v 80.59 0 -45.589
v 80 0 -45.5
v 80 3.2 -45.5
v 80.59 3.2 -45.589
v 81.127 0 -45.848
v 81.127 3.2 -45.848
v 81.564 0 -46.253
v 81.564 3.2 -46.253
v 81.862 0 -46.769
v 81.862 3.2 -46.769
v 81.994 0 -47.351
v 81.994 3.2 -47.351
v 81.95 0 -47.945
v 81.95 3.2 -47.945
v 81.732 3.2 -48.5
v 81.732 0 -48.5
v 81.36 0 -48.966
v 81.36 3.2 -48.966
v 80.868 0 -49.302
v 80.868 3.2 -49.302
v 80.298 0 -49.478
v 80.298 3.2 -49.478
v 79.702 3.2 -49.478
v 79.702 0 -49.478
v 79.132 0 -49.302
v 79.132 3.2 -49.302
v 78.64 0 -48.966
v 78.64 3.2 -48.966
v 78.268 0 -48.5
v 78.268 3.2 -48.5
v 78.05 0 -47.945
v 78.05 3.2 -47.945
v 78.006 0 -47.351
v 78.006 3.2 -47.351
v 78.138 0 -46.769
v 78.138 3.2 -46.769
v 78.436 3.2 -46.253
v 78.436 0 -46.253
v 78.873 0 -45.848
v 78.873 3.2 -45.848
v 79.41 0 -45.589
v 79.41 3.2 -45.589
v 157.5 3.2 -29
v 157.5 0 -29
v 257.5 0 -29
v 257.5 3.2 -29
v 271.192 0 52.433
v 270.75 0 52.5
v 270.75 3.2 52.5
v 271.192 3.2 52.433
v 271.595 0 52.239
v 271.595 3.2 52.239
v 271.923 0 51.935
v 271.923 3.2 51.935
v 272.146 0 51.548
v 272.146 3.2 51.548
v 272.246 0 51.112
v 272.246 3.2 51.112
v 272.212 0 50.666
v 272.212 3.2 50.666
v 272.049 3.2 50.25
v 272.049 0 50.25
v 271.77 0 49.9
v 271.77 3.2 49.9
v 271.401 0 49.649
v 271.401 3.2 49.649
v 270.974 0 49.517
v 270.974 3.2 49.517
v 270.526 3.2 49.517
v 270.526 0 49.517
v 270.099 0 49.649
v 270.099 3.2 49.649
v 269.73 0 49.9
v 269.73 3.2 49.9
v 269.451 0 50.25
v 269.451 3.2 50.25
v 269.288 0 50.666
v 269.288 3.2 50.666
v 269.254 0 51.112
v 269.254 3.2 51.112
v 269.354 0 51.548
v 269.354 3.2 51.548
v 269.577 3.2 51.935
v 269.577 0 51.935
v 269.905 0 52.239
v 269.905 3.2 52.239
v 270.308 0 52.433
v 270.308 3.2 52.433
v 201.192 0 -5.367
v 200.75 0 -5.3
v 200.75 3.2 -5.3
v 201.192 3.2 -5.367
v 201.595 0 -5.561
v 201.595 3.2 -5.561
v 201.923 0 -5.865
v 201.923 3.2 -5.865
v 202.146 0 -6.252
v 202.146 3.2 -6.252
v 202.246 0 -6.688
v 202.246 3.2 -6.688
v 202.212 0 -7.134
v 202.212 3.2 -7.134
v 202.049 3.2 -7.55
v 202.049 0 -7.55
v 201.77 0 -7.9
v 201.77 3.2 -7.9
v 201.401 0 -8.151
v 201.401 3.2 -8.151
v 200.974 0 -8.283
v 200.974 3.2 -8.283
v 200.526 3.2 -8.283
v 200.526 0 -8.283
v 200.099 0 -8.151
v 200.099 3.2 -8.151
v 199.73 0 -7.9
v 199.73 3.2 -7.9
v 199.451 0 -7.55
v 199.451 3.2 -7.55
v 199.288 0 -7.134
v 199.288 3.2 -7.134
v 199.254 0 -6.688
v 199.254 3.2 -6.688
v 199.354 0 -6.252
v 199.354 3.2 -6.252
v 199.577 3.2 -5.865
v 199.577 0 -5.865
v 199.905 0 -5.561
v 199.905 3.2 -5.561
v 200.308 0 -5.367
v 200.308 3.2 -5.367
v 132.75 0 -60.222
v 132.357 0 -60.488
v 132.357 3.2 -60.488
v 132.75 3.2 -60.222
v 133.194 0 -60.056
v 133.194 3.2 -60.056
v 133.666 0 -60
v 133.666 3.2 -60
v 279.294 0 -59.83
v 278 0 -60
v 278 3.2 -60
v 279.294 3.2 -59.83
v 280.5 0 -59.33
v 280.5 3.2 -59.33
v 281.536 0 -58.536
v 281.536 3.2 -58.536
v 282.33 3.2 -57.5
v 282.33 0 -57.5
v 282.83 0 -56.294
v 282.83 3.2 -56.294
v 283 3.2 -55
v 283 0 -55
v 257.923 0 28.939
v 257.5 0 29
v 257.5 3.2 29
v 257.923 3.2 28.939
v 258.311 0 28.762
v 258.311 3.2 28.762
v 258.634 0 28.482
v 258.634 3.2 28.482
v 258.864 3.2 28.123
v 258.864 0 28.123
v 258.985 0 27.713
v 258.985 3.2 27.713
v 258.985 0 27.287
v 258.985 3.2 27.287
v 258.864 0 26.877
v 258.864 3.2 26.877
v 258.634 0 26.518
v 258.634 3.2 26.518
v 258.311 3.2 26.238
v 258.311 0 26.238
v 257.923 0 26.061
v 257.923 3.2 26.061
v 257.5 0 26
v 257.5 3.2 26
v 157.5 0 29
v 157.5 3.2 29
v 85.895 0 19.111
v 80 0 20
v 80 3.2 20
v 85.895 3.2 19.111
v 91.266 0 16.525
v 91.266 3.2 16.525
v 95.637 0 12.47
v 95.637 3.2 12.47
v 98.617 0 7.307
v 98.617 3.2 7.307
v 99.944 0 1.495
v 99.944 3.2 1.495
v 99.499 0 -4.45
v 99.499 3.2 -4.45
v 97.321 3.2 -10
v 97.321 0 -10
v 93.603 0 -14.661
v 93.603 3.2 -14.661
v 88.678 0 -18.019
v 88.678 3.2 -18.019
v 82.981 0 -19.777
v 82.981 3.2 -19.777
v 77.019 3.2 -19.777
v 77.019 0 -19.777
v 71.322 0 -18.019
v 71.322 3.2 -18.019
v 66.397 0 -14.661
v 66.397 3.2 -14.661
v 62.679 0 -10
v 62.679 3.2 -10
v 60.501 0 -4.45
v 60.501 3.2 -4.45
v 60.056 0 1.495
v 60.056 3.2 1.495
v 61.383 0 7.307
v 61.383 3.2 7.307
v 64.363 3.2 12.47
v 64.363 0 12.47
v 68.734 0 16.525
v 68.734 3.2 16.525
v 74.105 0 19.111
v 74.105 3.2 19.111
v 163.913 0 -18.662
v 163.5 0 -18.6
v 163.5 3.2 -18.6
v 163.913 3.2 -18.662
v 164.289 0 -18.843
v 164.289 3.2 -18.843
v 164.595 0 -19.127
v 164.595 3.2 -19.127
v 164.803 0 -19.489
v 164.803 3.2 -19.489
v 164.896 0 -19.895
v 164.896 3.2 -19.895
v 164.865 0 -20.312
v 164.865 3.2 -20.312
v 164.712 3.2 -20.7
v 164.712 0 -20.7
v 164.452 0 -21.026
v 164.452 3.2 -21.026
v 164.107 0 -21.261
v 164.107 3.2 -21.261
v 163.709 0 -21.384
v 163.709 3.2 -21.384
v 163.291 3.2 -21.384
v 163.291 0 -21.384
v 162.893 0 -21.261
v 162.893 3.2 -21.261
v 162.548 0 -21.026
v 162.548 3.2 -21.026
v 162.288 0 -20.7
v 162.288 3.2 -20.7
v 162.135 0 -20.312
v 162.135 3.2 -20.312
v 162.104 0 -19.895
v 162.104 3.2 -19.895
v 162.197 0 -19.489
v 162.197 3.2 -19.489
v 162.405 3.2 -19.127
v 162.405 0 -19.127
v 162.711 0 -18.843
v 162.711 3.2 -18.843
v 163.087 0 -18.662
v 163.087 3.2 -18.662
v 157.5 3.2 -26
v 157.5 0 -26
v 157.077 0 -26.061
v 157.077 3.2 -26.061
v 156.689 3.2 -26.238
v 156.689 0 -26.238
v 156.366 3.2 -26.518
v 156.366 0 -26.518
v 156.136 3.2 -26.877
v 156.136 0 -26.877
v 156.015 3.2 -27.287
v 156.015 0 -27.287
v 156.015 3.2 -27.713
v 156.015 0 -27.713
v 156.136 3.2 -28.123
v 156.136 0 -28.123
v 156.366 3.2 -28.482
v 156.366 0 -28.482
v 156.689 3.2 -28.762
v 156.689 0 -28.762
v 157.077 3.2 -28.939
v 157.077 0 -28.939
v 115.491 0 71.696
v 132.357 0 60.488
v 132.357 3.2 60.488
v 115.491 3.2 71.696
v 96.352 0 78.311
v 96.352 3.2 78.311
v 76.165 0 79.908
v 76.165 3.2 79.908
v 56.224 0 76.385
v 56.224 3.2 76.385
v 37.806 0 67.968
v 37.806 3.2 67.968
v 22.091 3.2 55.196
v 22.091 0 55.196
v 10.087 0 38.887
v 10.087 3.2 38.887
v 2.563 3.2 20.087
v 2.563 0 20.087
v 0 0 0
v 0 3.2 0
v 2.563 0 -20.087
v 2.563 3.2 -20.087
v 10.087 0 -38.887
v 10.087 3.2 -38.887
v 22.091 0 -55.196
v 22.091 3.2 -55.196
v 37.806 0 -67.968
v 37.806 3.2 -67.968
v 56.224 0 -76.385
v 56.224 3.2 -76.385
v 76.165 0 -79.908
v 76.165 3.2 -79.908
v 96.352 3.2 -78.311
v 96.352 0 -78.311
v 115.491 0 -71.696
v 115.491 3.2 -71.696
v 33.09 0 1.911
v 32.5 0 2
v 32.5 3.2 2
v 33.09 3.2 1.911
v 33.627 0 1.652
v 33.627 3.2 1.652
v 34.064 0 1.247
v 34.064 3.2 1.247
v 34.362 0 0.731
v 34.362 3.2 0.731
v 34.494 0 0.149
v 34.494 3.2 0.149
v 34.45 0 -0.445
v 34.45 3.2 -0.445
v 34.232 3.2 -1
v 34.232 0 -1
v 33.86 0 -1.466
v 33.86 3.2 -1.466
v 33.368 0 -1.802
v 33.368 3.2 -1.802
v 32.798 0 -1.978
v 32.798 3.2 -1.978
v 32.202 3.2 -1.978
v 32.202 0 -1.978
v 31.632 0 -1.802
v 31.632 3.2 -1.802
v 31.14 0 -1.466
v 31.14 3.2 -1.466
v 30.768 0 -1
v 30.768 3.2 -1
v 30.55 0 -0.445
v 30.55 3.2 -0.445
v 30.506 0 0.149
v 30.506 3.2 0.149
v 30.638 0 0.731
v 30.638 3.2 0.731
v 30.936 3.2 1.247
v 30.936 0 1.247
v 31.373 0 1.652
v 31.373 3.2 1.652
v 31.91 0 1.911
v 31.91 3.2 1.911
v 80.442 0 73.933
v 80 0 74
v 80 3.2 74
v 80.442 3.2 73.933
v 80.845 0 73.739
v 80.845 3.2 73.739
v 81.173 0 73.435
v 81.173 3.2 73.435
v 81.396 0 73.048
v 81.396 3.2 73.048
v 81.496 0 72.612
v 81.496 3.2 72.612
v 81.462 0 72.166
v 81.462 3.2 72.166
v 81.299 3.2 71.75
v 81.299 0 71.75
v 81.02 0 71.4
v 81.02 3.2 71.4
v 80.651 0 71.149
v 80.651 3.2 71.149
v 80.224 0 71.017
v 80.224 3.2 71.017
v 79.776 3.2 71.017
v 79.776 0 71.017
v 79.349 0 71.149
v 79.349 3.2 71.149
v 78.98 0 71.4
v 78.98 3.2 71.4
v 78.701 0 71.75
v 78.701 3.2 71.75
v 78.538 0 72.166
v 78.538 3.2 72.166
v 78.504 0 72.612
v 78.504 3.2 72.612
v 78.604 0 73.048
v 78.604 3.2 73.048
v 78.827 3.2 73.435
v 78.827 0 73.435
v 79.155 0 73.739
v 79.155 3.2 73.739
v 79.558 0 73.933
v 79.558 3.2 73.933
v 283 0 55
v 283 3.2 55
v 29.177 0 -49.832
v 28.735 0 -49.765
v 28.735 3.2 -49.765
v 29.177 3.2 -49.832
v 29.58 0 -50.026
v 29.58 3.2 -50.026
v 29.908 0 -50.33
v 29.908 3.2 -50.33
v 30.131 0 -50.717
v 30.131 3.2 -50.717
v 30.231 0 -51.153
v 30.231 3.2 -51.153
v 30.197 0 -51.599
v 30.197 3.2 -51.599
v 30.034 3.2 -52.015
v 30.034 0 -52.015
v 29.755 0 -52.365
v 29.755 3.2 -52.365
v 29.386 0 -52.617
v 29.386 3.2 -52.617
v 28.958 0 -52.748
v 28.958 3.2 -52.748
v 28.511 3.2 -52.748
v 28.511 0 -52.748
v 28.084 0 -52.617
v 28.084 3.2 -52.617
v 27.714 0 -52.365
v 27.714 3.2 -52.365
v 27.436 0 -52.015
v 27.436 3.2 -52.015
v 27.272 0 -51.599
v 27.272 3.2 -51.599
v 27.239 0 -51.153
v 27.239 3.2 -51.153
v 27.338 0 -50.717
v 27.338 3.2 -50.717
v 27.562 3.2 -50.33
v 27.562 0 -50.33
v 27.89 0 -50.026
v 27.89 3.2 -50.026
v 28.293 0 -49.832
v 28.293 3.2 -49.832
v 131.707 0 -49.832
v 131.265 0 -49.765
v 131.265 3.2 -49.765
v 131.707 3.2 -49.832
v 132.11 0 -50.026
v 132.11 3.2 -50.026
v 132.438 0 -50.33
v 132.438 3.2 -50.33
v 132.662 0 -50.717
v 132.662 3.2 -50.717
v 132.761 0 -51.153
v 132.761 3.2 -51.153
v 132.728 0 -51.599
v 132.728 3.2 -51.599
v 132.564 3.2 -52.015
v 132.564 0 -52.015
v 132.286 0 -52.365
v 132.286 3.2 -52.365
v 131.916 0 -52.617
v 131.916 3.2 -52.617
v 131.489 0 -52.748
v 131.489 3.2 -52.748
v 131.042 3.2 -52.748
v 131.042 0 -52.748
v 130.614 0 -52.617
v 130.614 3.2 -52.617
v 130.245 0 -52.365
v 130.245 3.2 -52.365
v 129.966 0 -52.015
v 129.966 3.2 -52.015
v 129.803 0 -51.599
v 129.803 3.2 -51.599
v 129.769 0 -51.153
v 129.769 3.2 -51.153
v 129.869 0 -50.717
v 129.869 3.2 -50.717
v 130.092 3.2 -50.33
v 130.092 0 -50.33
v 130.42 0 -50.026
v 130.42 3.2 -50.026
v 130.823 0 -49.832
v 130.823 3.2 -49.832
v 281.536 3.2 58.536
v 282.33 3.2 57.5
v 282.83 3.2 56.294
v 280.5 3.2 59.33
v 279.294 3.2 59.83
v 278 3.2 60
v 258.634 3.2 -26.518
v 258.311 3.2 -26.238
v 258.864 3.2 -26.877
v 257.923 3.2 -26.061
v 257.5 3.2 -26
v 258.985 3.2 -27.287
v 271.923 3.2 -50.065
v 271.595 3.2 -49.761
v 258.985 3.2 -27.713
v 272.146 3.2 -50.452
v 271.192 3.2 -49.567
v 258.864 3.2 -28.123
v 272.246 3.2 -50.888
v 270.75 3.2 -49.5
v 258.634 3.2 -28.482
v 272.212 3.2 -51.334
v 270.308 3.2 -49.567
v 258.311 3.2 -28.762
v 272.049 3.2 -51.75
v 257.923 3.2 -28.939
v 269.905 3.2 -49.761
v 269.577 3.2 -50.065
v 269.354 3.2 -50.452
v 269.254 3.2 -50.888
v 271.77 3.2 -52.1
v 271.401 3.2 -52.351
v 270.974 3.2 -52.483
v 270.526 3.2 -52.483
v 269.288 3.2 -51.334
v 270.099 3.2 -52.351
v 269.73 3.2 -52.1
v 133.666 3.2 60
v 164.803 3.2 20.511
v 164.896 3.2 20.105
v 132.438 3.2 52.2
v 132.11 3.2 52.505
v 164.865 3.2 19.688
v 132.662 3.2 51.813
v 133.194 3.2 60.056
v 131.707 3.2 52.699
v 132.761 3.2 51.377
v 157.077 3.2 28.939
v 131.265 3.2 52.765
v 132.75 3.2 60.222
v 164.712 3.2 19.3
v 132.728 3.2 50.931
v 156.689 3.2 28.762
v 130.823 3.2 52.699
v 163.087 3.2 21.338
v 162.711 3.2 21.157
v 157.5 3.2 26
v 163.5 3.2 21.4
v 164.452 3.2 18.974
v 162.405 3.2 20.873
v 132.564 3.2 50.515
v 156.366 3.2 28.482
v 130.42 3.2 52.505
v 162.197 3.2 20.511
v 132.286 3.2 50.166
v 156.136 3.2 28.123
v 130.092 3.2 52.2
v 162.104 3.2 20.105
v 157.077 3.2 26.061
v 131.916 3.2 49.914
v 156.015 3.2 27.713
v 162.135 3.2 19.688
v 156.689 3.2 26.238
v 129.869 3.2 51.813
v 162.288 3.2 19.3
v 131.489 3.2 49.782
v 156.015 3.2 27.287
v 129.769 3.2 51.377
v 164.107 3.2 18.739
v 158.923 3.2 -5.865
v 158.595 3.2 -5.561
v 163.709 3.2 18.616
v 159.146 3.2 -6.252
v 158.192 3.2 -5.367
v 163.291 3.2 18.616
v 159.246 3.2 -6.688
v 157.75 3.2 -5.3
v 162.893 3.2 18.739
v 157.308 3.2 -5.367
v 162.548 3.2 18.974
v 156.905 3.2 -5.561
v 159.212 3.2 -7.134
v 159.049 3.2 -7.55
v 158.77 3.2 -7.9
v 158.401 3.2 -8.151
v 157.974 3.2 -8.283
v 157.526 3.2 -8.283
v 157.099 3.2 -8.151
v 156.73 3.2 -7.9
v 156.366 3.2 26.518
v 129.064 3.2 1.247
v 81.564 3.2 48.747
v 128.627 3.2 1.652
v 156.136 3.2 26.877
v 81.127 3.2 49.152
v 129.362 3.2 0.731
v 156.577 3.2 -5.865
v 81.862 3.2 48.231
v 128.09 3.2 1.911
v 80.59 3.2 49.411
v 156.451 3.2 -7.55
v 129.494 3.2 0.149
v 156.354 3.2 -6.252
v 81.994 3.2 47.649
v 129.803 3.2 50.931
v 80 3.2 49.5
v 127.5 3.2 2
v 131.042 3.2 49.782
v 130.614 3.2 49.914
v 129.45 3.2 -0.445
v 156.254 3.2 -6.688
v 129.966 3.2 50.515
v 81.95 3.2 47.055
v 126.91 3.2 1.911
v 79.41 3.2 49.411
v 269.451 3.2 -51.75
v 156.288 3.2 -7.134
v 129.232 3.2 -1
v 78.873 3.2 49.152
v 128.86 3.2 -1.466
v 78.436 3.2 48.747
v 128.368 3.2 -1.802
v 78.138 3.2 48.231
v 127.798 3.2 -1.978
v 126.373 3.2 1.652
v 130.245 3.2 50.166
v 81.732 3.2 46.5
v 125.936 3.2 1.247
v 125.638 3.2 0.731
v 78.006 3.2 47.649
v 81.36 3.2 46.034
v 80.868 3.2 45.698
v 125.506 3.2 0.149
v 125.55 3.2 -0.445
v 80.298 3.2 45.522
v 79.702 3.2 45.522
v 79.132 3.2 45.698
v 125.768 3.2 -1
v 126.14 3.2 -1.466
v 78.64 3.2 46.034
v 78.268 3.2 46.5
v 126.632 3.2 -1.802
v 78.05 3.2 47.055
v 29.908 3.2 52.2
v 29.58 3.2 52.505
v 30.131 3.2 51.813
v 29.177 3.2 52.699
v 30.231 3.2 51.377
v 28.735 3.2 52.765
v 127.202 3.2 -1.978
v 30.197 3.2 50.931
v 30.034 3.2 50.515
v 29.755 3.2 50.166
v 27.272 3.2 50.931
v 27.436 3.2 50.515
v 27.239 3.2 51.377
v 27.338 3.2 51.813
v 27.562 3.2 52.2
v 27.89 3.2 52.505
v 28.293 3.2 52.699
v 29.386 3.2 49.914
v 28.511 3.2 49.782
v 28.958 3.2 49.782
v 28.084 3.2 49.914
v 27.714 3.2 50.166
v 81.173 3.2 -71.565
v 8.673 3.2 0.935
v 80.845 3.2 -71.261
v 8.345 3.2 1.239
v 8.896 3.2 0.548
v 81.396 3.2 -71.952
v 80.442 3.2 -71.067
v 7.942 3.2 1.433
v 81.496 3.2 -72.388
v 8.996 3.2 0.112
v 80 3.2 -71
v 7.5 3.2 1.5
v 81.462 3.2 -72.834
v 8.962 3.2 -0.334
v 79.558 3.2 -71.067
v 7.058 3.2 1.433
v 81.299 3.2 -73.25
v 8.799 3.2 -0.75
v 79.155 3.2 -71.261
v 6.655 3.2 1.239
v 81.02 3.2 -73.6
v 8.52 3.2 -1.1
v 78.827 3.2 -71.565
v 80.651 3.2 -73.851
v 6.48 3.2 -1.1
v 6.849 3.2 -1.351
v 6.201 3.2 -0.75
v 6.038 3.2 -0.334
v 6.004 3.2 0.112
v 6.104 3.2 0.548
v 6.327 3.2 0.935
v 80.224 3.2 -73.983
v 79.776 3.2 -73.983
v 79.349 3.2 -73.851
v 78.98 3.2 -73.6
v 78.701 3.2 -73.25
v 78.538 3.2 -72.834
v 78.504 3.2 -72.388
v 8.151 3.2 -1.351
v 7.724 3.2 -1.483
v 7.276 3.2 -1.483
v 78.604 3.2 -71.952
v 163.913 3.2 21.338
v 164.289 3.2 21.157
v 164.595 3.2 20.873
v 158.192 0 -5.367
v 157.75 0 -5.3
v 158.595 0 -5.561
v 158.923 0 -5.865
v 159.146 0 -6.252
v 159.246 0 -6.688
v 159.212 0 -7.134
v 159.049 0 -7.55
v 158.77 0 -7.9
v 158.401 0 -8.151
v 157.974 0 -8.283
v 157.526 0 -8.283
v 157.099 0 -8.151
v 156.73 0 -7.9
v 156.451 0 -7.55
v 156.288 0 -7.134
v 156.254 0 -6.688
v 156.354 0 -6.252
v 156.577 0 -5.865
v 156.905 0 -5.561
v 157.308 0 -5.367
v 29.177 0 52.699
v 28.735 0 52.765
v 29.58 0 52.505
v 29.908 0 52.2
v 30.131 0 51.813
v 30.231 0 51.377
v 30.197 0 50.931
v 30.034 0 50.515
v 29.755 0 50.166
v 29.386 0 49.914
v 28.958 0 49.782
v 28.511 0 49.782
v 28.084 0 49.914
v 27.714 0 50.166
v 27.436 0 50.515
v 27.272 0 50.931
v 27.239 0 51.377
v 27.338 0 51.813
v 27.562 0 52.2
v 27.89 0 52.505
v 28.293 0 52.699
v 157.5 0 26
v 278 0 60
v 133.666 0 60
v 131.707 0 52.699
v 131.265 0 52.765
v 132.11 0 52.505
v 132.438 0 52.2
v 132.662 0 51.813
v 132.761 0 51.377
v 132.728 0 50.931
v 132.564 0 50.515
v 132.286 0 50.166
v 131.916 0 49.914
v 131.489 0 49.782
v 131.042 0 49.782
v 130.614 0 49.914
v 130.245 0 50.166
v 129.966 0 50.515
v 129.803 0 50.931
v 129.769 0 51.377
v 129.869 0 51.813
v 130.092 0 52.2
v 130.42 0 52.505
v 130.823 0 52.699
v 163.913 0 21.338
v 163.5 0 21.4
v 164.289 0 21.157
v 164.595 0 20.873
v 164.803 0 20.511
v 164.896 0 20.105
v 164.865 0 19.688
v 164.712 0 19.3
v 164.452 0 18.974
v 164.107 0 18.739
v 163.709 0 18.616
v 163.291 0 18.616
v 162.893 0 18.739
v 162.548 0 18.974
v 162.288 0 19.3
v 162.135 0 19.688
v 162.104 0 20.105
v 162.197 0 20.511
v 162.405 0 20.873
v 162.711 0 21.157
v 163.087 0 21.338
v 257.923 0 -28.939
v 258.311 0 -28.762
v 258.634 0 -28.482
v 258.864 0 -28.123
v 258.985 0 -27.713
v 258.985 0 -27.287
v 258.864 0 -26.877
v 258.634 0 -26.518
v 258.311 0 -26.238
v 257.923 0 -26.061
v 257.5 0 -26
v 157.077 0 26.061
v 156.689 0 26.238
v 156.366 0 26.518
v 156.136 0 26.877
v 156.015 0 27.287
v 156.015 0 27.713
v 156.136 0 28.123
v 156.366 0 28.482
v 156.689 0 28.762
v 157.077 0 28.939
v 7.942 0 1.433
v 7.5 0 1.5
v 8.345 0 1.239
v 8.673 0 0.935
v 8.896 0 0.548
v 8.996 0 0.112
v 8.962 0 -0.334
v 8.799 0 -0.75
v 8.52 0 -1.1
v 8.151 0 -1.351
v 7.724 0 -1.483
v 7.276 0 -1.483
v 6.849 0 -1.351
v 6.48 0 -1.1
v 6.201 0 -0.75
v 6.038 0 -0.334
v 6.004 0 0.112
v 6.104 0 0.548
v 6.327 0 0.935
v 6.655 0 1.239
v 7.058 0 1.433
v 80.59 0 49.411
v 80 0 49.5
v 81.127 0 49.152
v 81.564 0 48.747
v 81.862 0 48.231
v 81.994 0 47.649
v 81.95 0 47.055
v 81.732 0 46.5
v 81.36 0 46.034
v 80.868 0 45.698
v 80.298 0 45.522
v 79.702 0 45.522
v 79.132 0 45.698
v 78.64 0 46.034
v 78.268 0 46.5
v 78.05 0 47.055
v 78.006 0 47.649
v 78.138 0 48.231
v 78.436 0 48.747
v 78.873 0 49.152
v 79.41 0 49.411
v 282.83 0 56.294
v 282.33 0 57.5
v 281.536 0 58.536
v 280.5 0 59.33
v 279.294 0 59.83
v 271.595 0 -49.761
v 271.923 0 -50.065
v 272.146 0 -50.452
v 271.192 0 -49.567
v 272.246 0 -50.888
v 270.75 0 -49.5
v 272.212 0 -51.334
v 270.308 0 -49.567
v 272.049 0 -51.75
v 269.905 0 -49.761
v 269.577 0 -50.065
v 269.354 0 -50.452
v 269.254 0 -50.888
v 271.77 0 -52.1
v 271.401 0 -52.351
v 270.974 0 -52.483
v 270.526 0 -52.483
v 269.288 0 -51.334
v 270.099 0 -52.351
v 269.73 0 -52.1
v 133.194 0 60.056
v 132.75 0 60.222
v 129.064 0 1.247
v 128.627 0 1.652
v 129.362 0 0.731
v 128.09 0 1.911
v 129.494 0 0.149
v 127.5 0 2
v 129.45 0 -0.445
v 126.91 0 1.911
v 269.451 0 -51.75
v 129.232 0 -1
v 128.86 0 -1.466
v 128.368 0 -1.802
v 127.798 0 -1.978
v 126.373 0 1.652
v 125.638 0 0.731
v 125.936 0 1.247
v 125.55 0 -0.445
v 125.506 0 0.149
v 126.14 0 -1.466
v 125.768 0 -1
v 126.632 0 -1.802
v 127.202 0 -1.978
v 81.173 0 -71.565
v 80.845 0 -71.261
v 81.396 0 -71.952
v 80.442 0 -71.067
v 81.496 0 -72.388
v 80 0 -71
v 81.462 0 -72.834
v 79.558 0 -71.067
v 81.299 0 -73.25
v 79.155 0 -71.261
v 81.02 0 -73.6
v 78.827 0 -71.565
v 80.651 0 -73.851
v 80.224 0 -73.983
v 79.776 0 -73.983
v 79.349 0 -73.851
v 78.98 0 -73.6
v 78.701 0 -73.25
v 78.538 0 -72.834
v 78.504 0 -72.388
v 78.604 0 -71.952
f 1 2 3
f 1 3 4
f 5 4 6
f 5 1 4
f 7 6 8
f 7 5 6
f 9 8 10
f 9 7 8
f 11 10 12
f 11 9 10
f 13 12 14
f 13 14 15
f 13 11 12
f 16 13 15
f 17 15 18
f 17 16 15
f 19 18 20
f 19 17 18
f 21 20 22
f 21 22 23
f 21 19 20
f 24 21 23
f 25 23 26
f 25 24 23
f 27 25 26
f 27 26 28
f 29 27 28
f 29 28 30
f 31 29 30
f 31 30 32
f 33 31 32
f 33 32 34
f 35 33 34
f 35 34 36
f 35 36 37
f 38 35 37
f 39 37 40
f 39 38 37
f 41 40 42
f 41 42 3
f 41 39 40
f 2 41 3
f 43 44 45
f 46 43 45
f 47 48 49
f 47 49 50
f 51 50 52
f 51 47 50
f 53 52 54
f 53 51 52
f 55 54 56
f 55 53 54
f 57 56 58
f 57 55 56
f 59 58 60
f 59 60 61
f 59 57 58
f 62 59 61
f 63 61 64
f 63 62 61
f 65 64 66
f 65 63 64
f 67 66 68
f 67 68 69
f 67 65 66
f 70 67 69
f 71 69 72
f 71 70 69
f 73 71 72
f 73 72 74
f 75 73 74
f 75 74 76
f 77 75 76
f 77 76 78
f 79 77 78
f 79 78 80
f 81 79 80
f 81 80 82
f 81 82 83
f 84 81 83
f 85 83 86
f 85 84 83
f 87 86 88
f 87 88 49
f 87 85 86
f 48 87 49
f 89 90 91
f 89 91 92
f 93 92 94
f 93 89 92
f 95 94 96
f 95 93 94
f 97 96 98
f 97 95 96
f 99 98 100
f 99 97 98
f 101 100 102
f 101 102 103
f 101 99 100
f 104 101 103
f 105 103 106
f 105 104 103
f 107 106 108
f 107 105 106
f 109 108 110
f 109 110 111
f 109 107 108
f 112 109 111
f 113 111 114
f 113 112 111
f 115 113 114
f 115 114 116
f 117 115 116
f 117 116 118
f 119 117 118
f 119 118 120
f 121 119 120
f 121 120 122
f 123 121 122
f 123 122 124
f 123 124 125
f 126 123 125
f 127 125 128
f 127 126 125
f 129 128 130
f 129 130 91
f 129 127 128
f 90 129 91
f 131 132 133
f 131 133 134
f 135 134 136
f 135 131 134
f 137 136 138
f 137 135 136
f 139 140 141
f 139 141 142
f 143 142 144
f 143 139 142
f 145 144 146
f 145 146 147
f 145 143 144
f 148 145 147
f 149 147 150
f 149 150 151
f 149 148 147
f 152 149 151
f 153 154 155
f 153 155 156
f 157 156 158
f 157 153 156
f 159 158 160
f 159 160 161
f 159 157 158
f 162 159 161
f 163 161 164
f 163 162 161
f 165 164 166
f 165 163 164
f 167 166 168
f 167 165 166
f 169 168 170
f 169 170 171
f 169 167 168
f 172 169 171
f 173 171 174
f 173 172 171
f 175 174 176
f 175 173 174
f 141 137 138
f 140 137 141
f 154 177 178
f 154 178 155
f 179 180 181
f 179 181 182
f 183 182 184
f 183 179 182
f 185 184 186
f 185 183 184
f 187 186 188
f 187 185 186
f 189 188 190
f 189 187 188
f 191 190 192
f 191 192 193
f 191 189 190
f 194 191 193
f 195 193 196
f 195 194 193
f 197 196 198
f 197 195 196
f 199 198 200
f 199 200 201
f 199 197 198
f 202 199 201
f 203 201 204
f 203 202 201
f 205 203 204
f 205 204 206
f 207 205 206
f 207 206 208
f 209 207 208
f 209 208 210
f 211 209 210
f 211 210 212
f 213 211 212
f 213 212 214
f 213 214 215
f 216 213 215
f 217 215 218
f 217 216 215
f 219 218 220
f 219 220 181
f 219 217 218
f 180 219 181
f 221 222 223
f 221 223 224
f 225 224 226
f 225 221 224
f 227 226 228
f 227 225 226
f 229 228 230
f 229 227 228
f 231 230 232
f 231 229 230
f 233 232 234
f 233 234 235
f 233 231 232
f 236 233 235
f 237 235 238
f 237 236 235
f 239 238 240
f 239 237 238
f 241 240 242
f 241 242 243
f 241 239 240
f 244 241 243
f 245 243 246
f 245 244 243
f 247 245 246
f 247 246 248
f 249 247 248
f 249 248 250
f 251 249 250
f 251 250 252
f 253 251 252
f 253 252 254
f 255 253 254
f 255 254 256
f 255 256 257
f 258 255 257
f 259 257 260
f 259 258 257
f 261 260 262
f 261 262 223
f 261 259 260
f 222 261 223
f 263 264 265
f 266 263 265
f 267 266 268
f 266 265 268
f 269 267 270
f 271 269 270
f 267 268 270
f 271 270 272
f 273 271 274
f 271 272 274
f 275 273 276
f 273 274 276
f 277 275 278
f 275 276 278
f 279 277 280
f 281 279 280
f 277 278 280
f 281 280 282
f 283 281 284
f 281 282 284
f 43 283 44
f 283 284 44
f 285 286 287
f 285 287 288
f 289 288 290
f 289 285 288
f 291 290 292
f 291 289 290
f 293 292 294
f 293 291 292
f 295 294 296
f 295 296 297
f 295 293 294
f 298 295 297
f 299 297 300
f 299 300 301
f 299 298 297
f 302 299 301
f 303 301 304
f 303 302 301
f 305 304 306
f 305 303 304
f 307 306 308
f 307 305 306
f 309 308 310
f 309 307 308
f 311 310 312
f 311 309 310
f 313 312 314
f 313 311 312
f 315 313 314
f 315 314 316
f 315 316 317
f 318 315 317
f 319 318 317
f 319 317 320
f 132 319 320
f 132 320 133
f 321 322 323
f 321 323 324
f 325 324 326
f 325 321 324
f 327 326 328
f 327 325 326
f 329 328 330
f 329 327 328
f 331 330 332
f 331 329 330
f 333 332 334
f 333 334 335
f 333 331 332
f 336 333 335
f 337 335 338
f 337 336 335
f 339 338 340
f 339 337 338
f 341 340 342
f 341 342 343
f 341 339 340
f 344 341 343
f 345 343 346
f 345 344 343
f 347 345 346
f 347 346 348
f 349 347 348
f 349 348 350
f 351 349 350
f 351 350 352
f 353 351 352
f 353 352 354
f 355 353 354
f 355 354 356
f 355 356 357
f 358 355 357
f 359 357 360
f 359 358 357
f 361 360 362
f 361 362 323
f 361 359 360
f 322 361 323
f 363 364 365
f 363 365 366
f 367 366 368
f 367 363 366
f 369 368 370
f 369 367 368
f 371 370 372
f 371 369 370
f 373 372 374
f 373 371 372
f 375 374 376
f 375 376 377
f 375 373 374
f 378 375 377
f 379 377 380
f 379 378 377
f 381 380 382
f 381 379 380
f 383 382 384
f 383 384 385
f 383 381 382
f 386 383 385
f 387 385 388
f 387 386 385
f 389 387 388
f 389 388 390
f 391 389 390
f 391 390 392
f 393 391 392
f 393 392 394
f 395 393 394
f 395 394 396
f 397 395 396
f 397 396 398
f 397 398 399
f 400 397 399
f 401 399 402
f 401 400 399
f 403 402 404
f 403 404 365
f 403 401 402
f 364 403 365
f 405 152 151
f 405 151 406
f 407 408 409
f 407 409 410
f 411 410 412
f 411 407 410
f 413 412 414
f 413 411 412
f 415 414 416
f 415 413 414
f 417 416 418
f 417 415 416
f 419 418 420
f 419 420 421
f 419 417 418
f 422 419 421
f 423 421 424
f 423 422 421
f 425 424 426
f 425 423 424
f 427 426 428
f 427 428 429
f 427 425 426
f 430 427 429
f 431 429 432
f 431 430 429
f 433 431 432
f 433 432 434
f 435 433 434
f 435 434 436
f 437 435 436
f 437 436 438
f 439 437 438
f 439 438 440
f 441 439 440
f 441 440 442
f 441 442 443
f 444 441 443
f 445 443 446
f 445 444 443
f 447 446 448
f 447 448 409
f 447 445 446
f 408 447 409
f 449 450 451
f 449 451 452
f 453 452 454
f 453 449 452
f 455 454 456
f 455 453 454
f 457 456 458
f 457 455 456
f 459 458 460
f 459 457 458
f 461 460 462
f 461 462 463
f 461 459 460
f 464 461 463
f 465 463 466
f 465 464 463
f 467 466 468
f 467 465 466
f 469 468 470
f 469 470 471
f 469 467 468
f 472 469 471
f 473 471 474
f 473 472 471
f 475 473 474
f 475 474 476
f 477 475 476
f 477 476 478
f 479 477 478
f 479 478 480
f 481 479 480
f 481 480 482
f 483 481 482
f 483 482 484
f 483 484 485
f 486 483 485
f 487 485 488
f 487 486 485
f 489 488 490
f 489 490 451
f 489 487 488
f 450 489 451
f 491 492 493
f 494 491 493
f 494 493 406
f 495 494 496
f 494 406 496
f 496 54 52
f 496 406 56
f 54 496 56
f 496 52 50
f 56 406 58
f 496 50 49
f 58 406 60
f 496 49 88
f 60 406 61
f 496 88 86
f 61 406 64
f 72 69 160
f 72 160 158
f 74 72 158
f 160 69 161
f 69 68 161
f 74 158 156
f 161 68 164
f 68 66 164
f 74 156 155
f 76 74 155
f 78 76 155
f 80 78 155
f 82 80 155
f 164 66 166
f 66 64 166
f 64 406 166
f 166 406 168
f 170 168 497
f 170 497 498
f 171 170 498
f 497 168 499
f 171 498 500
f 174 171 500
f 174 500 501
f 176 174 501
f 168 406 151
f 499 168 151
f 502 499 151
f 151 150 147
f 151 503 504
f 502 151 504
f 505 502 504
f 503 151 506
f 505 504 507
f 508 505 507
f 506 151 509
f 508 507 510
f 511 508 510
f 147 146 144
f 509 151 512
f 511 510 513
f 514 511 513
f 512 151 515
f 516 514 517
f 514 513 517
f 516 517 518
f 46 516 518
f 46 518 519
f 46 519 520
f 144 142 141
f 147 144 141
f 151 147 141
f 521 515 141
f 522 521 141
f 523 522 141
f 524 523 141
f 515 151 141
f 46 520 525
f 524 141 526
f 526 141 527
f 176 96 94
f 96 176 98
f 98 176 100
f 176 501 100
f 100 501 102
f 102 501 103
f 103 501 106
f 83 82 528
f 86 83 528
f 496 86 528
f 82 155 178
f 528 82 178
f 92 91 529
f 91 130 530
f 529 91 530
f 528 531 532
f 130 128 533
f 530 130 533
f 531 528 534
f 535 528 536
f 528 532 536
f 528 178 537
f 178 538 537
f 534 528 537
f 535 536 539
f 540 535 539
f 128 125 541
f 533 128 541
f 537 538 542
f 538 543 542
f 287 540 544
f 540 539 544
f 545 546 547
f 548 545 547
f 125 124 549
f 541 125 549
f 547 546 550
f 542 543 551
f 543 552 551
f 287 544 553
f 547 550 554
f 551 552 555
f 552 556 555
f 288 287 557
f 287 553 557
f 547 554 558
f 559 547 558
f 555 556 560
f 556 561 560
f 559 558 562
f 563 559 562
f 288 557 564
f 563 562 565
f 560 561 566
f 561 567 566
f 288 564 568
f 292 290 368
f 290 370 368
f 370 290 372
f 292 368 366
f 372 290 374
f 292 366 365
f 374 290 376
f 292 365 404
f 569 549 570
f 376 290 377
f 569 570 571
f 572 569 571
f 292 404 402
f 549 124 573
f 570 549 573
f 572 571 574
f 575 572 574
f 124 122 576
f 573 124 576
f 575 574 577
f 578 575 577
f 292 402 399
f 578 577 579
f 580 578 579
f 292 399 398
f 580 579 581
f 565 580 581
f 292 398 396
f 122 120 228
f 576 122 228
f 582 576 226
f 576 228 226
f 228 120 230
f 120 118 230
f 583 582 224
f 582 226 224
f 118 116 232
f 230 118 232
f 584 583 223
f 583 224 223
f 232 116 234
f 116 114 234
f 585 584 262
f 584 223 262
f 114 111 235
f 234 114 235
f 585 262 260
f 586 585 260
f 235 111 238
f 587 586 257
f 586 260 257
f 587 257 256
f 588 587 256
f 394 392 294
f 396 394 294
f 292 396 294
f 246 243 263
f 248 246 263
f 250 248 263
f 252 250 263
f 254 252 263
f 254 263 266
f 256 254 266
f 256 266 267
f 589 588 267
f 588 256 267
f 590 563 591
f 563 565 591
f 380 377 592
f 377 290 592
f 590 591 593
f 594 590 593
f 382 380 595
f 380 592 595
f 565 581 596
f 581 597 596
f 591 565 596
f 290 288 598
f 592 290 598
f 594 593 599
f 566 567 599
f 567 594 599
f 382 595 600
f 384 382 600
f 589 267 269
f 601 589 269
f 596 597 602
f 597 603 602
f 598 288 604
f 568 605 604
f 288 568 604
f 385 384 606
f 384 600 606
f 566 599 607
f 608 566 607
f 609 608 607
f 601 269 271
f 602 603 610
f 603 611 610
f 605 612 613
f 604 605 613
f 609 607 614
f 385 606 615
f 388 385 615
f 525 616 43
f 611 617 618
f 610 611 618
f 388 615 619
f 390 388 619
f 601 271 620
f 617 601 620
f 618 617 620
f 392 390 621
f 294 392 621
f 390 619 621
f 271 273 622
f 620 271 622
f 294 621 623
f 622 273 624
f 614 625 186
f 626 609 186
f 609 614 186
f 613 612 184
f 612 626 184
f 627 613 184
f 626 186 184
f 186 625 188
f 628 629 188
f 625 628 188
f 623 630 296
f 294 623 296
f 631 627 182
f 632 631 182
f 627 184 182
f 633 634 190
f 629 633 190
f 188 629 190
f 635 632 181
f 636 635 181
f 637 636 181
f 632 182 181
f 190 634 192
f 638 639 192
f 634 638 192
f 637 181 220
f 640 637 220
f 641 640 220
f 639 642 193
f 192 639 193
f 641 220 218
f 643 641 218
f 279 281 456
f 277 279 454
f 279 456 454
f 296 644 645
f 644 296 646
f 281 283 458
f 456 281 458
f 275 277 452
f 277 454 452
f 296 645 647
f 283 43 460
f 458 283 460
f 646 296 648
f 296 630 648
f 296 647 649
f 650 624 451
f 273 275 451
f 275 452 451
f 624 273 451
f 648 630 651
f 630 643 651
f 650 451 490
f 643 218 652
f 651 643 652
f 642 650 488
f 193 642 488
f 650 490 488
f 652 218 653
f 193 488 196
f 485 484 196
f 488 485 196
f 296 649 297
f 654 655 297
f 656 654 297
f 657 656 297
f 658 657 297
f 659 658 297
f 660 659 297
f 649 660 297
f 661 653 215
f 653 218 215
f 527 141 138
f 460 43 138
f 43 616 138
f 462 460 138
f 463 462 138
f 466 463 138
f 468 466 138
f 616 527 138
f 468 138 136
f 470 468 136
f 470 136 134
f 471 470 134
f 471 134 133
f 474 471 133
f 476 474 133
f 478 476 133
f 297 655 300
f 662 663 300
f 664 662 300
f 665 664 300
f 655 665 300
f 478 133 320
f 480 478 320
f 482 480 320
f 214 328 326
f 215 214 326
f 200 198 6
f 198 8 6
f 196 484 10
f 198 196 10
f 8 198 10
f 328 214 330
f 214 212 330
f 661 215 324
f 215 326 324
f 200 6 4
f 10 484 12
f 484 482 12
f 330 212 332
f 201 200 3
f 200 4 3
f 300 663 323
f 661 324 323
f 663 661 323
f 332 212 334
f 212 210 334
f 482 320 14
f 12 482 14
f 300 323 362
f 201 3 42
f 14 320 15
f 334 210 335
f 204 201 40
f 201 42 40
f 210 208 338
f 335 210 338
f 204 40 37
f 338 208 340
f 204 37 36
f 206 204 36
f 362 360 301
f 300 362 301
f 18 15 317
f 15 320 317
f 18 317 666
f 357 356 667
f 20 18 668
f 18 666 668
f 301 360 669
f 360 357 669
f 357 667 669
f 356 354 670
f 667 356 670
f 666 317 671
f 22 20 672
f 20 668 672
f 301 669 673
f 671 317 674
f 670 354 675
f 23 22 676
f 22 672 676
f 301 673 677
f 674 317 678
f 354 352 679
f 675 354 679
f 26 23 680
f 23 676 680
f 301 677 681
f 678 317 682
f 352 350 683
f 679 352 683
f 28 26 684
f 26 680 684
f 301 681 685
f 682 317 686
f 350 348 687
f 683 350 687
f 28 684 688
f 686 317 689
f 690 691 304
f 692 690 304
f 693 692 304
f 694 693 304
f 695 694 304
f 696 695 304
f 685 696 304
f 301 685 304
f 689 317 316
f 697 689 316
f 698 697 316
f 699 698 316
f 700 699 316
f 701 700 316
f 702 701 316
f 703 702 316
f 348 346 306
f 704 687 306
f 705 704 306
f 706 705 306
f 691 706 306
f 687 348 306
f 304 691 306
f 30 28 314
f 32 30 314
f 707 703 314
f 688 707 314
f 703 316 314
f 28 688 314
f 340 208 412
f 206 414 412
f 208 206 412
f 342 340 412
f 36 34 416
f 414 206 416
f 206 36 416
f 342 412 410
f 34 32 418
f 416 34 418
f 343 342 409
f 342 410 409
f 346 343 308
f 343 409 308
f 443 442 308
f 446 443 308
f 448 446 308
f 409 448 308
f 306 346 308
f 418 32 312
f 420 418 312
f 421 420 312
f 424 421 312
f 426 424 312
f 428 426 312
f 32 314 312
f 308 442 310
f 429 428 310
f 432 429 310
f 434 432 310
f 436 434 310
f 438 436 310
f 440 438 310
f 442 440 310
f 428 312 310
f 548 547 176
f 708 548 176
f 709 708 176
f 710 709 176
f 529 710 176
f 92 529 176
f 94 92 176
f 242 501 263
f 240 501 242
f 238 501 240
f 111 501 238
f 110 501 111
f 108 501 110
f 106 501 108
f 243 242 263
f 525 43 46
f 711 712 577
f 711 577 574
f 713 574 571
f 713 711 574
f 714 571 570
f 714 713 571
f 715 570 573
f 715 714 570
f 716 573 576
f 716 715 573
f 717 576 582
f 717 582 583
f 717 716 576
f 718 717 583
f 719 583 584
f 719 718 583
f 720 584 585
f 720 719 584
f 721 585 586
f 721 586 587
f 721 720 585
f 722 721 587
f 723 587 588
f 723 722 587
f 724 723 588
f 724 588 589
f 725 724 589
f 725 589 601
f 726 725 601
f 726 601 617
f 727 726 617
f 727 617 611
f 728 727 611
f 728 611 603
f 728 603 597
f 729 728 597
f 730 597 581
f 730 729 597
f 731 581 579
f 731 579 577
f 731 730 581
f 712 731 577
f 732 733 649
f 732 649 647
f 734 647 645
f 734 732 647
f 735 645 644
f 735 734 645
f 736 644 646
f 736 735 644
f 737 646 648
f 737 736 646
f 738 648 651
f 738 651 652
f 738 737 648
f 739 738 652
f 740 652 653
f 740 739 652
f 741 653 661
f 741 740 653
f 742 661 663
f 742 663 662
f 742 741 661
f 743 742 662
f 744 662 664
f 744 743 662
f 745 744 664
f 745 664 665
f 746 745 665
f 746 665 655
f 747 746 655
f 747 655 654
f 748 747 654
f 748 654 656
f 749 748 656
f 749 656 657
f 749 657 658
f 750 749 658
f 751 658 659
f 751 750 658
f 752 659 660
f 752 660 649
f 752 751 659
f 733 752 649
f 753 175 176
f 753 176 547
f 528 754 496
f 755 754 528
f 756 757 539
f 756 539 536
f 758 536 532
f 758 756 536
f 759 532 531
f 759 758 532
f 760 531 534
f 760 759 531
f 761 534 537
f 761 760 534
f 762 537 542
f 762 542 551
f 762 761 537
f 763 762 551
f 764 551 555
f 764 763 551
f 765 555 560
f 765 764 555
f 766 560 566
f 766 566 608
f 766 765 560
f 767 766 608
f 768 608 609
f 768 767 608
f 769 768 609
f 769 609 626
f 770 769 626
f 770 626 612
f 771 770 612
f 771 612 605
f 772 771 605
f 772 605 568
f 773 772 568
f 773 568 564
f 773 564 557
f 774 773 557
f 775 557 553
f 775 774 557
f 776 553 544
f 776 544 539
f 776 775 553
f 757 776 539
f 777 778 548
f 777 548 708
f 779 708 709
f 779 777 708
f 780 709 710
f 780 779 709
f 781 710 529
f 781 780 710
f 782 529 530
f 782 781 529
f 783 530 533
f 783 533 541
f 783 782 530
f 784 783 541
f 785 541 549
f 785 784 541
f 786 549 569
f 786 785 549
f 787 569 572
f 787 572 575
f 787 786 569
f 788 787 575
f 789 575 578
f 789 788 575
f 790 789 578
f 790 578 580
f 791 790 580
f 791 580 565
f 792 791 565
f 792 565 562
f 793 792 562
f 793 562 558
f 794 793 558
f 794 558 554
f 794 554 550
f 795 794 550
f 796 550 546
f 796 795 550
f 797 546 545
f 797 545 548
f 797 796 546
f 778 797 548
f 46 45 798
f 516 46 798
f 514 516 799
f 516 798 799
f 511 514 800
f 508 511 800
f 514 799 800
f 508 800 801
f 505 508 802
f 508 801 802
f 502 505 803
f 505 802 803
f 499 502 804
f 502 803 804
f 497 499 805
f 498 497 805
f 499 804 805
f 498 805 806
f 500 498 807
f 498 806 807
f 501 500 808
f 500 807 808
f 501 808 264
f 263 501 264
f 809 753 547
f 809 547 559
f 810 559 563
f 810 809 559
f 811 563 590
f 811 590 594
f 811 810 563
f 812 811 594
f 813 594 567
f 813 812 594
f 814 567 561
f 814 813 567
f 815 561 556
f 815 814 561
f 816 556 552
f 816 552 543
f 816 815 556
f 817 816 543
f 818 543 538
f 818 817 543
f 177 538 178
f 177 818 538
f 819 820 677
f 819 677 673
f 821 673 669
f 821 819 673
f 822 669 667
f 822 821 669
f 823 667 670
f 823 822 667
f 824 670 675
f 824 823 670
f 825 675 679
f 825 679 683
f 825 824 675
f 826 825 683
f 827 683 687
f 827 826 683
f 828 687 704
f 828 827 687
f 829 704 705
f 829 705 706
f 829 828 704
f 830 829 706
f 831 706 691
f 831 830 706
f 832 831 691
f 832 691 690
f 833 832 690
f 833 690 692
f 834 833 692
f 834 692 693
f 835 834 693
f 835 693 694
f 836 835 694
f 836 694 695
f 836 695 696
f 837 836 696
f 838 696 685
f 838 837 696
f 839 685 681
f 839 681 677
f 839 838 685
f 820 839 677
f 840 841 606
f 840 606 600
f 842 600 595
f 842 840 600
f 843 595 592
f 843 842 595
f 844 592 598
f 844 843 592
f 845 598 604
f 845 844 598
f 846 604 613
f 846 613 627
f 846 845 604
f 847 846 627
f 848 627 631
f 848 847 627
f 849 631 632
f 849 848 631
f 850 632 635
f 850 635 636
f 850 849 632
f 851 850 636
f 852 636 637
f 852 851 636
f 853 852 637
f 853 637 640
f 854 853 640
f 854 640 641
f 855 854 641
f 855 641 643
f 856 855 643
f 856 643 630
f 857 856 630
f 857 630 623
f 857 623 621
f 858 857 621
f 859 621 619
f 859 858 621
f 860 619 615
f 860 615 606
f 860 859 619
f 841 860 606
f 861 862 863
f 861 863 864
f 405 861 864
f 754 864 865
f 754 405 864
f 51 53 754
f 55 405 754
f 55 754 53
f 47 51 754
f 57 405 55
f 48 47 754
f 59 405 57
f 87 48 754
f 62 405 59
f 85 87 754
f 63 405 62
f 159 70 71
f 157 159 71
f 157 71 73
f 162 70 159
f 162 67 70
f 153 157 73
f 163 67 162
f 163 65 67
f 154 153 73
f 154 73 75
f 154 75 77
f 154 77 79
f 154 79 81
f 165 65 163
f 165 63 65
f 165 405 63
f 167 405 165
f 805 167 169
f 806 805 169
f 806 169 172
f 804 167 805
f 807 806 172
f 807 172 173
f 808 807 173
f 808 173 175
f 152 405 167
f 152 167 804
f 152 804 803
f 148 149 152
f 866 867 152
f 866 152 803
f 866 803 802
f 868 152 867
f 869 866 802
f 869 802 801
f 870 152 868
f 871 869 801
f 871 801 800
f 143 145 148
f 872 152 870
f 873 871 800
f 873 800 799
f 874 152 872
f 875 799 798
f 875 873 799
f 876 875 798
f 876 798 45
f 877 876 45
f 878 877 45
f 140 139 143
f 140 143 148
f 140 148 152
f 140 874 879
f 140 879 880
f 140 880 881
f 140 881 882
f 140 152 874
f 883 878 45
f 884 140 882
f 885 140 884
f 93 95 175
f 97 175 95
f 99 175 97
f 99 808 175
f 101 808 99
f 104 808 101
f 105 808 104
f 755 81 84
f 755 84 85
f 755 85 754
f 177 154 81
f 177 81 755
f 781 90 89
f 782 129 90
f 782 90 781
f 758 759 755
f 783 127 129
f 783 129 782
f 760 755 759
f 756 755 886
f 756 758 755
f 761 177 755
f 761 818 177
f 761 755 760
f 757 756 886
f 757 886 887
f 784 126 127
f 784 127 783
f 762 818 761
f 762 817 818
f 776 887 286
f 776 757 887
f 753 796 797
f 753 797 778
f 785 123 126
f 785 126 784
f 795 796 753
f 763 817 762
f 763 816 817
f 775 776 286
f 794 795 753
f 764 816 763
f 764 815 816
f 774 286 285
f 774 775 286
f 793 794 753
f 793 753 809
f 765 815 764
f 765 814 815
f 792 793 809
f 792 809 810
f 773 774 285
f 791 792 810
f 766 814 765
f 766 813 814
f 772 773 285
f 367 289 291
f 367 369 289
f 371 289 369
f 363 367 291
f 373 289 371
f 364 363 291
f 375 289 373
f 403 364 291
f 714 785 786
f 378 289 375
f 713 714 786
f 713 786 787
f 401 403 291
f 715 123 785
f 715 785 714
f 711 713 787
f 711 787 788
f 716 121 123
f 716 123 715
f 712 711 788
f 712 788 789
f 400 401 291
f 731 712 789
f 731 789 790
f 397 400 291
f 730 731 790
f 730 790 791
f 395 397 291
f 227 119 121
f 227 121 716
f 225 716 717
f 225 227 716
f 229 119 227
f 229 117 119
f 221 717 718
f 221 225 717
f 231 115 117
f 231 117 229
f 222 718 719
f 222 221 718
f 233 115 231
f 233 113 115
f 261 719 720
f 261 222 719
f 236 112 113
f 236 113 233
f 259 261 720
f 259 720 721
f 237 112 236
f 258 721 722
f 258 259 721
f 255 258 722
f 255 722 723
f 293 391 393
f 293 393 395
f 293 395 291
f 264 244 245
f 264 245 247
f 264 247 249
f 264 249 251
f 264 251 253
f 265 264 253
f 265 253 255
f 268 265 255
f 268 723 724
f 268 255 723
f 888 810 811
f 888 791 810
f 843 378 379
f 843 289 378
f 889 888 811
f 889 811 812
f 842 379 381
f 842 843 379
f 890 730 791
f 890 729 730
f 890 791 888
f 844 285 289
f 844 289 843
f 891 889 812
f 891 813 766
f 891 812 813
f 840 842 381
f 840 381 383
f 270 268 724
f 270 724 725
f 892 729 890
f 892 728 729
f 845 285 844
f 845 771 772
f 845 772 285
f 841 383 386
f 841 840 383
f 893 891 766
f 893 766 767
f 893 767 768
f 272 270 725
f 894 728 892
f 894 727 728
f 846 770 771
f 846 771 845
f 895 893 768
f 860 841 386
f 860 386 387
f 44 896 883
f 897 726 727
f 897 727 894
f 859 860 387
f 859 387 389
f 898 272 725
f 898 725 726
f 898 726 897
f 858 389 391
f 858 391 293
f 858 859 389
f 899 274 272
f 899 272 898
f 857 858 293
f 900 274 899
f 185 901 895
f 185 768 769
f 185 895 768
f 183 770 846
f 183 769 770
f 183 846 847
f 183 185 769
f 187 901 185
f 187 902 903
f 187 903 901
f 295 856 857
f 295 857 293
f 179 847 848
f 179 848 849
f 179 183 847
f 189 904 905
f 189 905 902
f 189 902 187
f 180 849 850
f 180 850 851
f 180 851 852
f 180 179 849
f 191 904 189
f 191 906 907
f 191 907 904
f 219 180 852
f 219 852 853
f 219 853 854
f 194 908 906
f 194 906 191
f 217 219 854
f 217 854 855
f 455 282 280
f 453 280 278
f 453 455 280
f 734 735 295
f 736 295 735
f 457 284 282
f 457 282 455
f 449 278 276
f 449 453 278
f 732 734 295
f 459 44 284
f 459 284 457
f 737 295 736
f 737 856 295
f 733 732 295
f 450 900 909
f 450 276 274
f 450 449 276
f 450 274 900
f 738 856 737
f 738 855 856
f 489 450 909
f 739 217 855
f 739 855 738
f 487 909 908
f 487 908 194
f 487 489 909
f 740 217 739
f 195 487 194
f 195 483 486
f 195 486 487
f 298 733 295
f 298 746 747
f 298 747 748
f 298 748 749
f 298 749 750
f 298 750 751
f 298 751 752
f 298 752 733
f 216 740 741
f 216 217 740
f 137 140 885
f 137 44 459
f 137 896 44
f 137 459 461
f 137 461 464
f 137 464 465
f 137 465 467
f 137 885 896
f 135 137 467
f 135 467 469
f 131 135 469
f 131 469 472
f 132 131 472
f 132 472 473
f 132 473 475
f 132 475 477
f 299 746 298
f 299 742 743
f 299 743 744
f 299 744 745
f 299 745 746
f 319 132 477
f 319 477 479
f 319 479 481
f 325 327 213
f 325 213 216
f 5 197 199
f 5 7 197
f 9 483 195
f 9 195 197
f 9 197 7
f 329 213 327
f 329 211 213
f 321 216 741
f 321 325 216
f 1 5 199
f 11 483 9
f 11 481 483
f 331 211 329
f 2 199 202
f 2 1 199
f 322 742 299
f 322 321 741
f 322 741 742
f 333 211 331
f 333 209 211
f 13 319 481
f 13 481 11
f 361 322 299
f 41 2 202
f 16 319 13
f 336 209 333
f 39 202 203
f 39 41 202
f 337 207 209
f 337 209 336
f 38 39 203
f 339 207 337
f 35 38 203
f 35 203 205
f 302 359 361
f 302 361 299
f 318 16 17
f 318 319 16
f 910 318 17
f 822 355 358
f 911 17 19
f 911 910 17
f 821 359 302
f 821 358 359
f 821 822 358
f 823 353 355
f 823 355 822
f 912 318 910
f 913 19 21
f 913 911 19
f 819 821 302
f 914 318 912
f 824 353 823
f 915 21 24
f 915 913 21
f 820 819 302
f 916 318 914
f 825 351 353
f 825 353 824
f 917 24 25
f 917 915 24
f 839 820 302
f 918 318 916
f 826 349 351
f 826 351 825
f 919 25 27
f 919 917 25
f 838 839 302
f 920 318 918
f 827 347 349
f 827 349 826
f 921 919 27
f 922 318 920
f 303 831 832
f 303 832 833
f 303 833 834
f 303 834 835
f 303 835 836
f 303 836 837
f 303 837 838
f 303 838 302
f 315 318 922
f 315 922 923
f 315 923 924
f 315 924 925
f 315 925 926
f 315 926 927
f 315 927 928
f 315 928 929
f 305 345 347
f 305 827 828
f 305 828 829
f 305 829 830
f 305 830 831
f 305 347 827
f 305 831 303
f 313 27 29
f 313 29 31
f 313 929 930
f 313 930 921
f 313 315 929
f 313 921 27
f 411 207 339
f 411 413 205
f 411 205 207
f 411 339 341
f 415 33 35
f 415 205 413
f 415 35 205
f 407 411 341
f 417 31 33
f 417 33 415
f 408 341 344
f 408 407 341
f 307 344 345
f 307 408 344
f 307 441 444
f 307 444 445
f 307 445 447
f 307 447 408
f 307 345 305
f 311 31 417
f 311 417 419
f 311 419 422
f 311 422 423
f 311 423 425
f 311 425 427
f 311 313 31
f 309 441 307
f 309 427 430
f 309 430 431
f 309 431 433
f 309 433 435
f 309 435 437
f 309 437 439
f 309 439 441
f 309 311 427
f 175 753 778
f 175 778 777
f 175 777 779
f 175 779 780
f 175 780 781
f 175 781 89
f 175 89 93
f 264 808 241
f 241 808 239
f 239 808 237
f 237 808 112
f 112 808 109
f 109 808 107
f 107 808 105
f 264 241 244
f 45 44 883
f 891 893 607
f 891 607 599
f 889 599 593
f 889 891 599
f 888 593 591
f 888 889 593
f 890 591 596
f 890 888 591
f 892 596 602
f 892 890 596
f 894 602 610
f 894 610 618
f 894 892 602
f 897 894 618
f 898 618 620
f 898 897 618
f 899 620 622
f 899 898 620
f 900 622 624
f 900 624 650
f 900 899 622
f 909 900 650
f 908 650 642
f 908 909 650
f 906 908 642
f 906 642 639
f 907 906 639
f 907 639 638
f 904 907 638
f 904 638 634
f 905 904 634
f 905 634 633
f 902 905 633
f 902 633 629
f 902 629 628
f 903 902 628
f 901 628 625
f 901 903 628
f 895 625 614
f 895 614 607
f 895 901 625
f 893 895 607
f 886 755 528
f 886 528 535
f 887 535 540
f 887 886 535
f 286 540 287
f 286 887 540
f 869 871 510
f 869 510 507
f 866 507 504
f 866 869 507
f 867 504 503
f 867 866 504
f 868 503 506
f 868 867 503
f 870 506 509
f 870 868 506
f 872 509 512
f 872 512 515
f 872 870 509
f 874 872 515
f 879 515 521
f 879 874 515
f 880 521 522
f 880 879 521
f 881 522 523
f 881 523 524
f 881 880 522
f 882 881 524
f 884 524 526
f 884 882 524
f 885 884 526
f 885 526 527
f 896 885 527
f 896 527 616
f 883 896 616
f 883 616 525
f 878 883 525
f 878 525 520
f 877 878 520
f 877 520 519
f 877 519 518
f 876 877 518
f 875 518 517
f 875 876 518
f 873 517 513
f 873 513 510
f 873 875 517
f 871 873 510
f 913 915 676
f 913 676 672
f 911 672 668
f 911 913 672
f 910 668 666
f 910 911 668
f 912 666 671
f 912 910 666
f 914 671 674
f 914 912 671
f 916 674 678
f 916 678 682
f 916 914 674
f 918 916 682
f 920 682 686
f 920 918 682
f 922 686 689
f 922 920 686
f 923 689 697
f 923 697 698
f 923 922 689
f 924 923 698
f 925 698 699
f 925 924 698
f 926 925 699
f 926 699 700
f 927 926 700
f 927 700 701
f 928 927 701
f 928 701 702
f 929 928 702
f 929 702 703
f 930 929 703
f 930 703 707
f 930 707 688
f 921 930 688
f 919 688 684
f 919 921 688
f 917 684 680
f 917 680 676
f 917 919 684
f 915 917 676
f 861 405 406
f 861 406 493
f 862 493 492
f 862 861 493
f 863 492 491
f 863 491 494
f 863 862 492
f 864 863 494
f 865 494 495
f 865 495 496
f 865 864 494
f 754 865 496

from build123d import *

# Parameters (mm, degrees)
SKETCH1_R           = 20
SKETCH1_R_2         = 1.5
SKETCH1_R_3         = 2
SKETCH1_R_4         = 1.4
BOSS_EXTRUDE1_DEPTH = 3.2


with BuildPart() as part:
    # Sketch1 → Boss-Extrude1 (new body)
    with BuildSketch(Plane(origin=(0, 0, 0), x_dir=(1, 0, 0), z_dir=(0, 1, 0))):
        with BuildLine():
            Line((283, 55), (283, -55))
            ThreePointArc((283, -55), (281.535533906, -58.535533906), (278, -60))
            Line((278, -60), (133.66563146, -60))
            ThreePointArc((133.66563146, -60), (132.967201164, -60.125914857), (132.35671362, -60.487804878))
            ThreePointArc((132.35671362, -60.487804878), (0, 0), (132.35671362, 60.487804878))
            ThreePointArc((132.35671362, 60.487804878), (132.967201164, 60.125914857), (133.66563146, 60))
            Line((133.66563146, 60), (278, 60))
            ThreePointArc((278, 60), (281.535533906, 58.535533906), (283, 55))
        make_face()
        with Locations(Location((80, 0, 0), (0, 0, 270))):
            Circle(SKETCH1_R, mode=Mode.SUBTRACT)
        with Locations(Location((7.5, 0, 0), (0, 0, 270))):
            Circle(SKETCH1_R_2, mode=Mode.SUBTRACT)
        with Locations(Location((28.734758364, 51.265241636, 0), (0, 0, 270))):
            Circle(SKETCH1_R_2, mode=Mode.SUBTRACT)
        with Locations(Location((80, 72.5, 0), (0, 0, 270))):
            Circle(SKETCH1_R_2, mode=Mode.SUBTRACT)
        with Locations(Location((131.265241636, 51.265241636, 0), (0, 0, 270))):
            Circle(SKETCH1_R_2, mode=Mode.SUBTRACT)
        with Locations(Location((131.265241636, -51.265241636, 0), (0, 0, 270))):
            Circle(SKETCH1_R_2, mode=Mode.SUBTRACT)
        with Locations(Location((80, -72.5, 0), (0, 0, 270))):
            Circle(SKETCH1_R_2, mode=Mode.SUBTRACT)
        with Locations(Location((28.734758364, -51.265241636, 0), (0, 0, 270))):
            Circle(SKETCH1_R_2, mode=Mode.SUBTRACT)
        with Locations(Location((32.5, 0, 0), (0, 0, 270))):
            Circle(SKETCH1_R_3, mode=Mode.SUBTRACT)
        with Locations(Location((80, 47.5, 0), (0, 0, 270))):
            Circle(SKETCH1_R_3, mode=Mode.SUBTRACT)
        with Locations(Location((127.5, 0, 0), (0, 0, 270))):
            Circle(SKETCH1_R_3, mode=Mode.SUBTRACT)
        with Locations(Location((80, -47.5, 0), (0, 0, 270))):
            Circle(SKETCH1_R_3, mode=Mode.SUBTRACT)
        with Locations(Location((270.75, 51, 0), (0, 0, 270))):
            Circle(SKETCH1_R_2, mode=Mode.SUBTRACT)
        with Locations(Location((270.75, -51, 0), (0, 0, 270))):
            Circle(SKETCH1_R_2, mode=Mode.SUBTRACT)
        with Locations(Location((163.5, 20, 0), (0, 0, 270))):
            Circle(SKETCH1_R_4, mode=Mode.SUBTRACT)
        with Locations(Location((163.5, -20, 0), (0, 0, 270))):
            Circle(SKETCH1_R_4, mode=Mode.SUBTRACT)
        with Locations(Location((157.75, 6.8, 0), (0, 0, 270))):
            Circle(SKETCH1_R_2, mode=Mode.SUBTRACT)
        with Locations(Location((200.75, 6.8, 0), (0, 0, 270))):
            Circle(SKETCH1_R_2, mode=Mode.SUBTRACT)
        with BuildLine():
            Line((157.5, -29), (257.5, -29))
            ThreePointArc((257.5, -29), (259, -27.5), (257.5, -26))
            Line((257.5, -26), (157.5, -26))
            ThreePointArc((157.5, -26), (156, -27.5), (157.5, -29))
        make_face(mode=Mode.SUBTRACT)
        with BuildLine():
            Line((257.5, 26), (157.5, 26))
            ThreePointArc((157.5, 26), (156, 27.5), (157.5, 29))
            Line((157.5, 29), (257.5, 29))
            ThreePointArc((257.5, 29), (259, 27.5), (257.5, 26))
        make_face(mode=Mode.SUBTRACT)
    extrude(amount=BOSS_EXTRUDE1_DEPTH)


solid = part.part
